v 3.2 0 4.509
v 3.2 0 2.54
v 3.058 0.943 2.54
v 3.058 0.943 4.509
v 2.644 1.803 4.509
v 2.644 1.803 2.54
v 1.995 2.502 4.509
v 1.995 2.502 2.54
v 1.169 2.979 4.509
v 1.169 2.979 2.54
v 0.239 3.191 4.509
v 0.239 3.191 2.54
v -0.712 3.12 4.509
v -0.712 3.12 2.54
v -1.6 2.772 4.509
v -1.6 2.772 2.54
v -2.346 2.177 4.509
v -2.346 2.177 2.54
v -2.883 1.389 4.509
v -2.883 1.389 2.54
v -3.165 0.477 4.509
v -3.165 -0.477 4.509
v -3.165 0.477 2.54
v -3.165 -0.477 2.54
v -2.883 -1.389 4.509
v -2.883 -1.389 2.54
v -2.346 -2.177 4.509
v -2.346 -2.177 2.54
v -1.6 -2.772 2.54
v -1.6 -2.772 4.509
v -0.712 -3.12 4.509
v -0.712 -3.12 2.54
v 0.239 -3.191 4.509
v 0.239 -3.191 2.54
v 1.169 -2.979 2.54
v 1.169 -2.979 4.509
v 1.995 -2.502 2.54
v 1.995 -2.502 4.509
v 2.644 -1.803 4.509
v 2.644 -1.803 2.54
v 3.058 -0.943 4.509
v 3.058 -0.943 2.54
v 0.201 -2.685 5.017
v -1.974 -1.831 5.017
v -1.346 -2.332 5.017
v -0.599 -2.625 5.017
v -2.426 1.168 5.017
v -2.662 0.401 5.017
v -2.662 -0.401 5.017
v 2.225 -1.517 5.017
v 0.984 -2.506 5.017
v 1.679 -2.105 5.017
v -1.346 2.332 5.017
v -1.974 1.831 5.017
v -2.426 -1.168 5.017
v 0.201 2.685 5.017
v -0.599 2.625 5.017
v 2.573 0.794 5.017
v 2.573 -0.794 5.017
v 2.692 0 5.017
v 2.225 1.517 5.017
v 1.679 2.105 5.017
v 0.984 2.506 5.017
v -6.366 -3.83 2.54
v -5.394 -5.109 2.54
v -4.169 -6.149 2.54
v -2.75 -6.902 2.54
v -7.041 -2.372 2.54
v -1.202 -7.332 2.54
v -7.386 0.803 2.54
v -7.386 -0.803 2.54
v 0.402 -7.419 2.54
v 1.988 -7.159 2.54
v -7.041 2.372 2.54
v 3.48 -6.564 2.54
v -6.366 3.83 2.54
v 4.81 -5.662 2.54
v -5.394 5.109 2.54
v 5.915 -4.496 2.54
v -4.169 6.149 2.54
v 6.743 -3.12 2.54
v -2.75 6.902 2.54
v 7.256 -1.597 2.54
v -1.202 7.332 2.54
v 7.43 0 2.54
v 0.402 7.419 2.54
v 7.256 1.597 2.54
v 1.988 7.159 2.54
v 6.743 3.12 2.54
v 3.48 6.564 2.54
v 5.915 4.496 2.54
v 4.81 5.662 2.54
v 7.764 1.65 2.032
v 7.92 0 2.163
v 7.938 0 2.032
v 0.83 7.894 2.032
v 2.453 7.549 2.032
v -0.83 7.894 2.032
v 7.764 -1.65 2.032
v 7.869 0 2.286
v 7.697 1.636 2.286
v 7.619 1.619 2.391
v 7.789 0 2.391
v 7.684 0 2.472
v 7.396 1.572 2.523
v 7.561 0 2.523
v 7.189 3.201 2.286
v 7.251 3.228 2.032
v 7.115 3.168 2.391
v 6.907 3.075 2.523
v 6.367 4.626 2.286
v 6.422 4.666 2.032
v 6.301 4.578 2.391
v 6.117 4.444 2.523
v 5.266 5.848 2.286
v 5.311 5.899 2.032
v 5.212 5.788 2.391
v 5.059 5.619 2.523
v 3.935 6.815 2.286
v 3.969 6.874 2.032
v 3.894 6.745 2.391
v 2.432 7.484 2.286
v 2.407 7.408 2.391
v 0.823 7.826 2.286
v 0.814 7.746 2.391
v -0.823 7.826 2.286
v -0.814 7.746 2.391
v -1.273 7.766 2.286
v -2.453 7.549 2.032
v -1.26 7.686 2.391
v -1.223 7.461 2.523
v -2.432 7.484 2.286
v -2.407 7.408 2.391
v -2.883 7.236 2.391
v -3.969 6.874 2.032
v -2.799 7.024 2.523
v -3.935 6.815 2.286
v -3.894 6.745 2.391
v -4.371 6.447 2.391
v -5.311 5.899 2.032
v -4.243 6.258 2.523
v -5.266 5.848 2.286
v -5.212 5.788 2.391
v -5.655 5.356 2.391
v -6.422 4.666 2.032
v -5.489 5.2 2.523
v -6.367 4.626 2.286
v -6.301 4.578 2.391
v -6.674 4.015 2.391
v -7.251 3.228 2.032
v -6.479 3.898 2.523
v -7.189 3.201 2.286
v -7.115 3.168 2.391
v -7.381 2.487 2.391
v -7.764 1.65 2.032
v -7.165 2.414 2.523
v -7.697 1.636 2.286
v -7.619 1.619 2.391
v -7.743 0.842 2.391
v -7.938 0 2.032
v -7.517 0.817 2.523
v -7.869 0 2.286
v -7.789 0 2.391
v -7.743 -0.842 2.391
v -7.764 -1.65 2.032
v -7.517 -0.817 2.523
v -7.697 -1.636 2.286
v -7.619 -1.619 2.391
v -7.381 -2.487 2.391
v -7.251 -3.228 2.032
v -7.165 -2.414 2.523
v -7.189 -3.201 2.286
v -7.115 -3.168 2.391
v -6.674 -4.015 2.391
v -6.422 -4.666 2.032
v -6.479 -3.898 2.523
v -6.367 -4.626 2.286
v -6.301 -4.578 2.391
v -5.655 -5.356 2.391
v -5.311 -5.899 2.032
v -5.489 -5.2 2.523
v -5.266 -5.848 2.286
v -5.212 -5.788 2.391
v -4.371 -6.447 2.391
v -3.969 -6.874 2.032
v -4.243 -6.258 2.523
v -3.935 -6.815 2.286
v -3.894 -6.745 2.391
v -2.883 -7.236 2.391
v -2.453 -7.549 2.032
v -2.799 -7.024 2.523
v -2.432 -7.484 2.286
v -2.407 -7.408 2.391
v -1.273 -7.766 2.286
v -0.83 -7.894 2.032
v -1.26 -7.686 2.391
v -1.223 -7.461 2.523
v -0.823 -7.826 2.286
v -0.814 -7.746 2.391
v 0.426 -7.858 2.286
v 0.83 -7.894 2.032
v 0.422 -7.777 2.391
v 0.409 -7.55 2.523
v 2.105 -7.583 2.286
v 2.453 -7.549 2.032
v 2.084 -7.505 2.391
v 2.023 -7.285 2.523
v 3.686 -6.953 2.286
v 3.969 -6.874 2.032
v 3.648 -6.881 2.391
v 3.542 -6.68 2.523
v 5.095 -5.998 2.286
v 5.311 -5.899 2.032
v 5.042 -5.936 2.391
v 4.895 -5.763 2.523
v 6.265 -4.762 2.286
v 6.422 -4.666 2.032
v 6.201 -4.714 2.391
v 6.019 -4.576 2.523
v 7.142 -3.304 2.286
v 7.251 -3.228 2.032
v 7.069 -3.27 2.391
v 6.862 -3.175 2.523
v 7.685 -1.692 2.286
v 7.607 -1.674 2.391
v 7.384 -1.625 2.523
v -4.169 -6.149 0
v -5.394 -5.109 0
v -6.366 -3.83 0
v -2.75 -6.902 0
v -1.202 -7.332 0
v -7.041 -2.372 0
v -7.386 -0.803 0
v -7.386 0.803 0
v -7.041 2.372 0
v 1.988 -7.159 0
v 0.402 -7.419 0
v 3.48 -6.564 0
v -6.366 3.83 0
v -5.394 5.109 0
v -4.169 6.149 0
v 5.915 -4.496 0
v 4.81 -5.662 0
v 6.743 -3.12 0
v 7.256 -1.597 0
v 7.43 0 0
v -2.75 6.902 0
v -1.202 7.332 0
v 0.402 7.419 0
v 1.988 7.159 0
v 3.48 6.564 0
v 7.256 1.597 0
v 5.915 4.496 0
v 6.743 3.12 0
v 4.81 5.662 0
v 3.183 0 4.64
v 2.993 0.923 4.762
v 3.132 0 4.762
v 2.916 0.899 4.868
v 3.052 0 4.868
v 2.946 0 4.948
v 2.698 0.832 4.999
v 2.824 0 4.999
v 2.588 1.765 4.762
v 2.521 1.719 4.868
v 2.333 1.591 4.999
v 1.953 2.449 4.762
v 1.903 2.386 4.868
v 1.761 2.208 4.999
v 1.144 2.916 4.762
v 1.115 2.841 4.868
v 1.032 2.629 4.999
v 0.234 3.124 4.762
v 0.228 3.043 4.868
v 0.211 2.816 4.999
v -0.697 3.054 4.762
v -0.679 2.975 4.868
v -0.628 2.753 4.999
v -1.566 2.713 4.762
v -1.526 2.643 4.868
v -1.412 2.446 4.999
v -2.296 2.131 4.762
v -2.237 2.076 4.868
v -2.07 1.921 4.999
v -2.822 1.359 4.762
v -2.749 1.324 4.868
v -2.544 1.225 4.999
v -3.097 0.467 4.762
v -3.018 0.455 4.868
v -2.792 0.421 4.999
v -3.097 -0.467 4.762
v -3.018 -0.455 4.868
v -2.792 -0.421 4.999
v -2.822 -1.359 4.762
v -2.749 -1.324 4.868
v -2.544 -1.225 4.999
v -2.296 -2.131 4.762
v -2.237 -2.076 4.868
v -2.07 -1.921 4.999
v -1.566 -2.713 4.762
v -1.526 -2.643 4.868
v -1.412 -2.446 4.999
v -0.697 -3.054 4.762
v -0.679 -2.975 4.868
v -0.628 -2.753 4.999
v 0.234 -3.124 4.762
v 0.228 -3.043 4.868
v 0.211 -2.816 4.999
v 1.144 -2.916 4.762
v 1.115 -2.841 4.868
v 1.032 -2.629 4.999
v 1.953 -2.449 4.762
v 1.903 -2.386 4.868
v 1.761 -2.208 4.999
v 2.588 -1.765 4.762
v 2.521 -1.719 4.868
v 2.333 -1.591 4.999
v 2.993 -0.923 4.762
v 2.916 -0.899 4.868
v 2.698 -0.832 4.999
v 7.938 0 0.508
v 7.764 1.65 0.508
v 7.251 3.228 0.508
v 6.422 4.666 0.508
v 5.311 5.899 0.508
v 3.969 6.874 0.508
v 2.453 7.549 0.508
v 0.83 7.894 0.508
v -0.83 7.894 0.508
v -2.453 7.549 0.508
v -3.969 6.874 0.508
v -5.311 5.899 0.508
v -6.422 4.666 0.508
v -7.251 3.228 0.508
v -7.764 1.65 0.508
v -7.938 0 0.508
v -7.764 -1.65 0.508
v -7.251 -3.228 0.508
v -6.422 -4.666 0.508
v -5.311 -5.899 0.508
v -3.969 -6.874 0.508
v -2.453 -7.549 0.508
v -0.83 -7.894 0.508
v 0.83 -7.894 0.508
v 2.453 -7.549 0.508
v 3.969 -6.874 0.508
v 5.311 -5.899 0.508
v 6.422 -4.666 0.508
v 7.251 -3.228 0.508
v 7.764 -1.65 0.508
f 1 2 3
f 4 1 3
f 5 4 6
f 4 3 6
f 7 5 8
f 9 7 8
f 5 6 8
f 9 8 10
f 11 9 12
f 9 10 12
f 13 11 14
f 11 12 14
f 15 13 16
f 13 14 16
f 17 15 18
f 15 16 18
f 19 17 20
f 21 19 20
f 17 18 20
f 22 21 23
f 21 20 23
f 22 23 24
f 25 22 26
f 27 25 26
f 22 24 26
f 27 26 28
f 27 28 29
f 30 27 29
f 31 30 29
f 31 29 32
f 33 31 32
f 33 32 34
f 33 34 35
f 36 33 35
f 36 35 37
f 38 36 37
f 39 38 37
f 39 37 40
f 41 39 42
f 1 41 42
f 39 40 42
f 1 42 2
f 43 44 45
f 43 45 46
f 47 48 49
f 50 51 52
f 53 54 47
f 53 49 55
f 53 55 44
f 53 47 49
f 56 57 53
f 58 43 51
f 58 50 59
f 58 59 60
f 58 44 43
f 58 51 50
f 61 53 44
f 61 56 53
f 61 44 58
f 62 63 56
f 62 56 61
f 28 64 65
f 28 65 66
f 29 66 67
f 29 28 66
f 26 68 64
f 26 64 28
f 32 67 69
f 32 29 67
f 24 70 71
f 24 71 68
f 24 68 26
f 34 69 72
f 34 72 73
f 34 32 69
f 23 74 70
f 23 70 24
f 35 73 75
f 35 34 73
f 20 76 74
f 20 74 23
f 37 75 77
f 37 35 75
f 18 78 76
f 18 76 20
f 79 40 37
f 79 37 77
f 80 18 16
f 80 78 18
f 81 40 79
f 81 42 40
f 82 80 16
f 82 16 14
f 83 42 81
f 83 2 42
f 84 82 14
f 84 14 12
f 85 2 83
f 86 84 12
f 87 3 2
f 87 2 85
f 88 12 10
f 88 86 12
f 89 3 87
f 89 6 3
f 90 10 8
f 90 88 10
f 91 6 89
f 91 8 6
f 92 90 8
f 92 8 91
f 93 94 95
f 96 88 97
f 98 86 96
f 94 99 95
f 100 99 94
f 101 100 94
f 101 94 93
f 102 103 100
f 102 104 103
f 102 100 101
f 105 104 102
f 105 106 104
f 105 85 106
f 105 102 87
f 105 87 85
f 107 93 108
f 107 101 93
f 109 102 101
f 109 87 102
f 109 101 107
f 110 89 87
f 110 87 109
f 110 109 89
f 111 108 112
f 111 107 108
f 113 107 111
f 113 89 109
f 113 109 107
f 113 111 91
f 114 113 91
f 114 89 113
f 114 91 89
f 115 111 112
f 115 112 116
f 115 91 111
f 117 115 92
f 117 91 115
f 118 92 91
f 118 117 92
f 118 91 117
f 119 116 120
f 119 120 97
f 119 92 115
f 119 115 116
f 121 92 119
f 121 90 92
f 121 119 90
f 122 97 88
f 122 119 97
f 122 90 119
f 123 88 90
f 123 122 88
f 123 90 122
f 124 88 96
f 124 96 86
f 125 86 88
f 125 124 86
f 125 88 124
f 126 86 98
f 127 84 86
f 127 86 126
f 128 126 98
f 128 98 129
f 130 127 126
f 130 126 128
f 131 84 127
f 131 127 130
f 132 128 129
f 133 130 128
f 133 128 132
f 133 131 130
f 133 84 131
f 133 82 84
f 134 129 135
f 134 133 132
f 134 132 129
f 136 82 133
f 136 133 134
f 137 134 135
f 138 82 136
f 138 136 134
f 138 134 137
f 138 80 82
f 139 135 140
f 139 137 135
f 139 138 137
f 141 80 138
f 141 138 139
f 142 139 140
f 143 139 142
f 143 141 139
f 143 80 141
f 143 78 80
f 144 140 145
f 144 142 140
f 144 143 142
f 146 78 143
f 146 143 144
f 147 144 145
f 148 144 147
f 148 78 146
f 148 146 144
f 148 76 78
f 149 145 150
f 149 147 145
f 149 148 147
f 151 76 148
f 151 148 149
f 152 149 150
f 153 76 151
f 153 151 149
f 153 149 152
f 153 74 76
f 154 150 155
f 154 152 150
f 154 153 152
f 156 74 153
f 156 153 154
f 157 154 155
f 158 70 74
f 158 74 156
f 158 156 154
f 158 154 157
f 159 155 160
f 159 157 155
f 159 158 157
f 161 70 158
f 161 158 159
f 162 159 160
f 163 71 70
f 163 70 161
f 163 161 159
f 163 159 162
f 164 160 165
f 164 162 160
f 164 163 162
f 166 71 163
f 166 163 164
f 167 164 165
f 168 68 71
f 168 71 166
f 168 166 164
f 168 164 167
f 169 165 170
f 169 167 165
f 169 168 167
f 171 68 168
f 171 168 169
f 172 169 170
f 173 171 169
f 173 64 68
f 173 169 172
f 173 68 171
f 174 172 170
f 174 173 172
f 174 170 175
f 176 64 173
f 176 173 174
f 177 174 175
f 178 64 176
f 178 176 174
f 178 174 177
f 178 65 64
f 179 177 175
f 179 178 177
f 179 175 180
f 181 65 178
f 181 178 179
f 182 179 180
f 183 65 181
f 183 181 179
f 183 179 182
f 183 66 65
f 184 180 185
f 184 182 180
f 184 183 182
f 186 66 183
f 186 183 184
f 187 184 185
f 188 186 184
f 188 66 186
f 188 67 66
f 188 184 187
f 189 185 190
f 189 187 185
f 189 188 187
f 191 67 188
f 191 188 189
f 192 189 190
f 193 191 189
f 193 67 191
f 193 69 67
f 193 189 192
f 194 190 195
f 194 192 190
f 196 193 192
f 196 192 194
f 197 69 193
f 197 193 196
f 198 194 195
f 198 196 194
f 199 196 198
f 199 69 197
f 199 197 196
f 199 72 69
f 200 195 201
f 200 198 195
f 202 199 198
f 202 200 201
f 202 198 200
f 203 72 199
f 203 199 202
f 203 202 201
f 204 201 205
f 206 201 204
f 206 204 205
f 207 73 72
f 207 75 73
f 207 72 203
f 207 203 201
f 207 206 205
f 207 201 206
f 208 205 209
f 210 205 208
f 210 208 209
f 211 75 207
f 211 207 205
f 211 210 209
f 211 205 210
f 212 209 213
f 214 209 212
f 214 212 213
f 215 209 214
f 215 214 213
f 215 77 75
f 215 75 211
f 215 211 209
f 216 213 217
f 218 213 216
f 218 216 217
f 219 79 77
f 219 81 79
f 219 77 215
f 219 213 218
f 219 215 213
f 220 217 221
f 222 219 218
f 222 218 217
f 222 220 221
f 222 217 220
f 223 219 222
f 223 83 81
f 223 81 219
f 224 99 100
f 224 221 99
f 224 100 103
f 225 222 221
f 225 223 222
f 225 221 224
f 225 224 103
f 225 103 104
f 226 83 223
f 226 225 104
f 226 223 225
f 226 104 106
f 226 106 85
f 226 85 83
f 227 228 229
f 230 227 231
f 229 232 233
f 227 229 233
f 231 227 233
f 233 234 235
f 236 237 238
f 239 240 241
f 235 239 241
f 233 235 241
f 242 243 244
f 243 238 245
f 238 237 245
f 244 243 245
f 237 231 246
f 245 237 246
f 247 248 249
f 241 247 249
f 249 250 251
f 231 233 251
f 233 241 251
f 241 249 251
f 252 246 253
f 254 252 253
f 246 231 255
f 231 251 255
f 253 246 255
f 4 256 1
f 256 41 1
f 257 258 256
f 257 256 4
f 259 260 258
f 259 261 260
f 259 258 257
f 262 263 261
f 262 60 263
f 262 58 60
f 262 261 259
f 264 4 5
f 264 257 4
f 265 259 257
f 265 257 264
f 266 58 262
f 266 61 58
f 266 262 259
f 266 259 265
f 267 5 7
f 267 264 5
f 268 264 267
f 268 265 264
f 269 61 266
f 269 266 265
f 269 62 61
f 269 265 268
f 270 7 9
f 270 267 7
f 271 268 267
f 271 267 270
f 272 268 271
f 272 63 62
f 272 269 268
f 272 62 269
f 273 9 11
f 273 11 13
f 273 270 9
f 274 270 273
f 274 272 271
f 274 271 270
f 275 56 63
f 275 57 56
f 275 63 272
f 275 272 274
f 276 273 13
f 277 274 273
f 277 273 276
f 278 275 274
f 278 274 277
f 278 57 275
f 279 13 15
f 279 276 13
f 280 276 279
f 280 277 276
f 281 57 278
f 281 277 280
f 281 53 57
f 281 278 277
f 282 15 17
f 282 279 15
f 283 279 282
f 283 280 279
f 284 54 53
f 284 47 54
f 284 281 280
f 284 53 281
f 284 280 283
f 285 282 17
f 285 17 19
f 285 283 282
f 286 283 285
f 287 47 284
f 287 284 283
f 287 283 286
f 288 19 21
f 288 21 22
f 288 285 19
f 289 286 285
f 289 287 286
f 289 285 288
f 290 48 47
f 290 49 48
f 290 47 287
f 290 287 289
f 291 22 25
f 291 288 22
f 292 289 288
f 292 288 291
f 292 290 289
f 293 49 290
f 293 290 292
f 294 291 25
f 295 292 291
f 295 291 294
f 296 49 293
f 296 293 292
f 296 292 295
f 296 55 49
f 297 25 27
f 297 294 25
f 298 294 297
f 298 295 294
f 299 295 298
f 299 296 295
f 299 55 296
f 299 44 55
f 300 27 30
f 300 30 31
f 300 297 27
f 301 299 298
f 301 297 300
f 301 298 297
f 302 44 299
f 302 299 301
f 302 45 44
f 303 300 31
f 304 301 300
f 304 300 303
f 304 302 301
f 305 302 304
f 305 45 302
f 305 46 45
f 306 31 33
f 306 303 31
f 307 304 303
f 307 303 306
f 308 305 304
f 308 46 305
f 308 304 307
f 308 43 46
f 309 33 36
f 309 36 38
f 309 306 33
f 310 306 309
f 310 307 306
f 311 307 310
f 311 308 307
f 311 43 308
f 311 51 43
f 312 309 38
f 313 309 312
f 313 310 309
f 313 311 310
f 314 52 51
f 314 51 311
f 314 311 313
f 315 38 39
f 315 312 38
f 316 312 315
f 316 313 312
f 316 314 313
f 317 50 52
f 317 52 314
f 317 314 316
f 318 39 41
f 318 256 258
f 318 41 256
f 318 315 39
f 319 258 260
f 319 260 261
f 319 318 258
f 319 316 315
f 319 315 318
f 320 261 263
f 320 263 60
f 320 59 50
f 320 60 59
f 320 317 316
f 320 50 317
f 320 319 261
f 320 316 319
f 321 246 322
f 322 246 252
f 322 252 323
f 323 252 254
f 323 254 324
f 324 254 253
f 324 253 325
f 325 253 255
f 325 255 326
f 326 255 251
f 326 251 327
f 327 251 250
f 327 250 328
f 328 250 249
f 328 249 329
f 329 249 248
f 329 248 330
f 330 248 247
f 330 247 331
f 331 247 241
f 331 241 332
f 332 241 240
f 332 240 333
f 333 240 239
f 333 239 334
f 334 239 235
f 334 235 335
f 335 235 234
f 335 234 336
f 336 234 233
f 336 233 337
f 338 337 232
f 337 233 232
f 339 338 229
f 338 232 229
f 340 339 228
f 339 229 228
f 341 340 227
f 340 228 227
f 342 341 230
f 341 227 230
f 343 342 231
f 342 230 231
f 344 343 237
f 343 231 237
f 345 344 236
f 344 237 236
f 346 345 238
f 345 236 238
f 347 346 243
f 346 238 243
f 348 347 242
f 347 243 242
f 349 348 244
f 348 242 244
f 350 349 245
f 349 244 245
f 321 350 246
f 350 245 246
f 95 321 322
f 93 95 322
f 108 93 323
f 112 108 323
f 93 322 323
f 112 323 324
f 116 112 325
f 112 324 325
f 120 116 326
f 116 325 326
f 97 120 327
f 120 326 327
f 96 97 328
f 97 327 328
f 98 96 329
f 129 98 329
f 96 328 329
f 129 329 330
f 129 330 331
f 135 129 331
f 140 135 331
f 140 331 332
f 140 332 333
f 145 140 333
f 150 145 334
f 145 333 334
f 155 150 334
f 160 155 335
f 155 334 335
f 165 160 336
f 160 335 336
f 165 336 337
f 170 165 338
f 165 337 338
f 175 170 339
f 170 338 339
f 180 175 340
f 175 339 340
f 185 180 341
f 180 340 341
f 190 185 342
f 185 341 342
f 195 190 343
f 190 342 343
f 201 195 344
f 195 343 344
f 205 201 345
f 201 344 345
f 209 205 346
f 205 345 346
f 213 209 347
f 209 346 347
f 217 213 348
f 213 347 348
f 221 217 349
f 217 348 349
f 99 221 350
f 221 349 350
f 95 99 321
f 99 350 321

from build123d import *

# Parameters (mm, degrees)
F0_R     = 7.9375
F2_DEPTH = 2.54
F3_START = 2.54
F1_R     = 3.2004
F3_DEPTH = 2.4765
F4_R     = 0.508
F5_SIZE  = 0.508


with BuildPart() as f2:
    # F0 (on Top) → F2 (new body)
    with BuildSketch(Plane.XY):
        Circle(F0_R)
    extrude(amount=F2_DEPTH)

    # F1 (on Top) → F3 (join)
    with BuildSketch(Plane.XY.offset(F3_START)):
        Circle(F1_R)
    extrude(amount=F3_DEPTH)

    # F4
    f4_edges = [f2.edges().sort_by_distance(p)[0] for p in [
        (-3.2004, 0, 5.0165),
        (-7.9375, 0, 2.54),
    ]]
    fillet(f4_edges, radius=F4_R)

    # F5
    f5_edges = [f2.edges().sort_by_distance(p)[0] for p in [
        (-7.9375, 0, 0),
    ]]
    chamfer(f5_edges, length=F5_SIZE)


solid = f2.part
